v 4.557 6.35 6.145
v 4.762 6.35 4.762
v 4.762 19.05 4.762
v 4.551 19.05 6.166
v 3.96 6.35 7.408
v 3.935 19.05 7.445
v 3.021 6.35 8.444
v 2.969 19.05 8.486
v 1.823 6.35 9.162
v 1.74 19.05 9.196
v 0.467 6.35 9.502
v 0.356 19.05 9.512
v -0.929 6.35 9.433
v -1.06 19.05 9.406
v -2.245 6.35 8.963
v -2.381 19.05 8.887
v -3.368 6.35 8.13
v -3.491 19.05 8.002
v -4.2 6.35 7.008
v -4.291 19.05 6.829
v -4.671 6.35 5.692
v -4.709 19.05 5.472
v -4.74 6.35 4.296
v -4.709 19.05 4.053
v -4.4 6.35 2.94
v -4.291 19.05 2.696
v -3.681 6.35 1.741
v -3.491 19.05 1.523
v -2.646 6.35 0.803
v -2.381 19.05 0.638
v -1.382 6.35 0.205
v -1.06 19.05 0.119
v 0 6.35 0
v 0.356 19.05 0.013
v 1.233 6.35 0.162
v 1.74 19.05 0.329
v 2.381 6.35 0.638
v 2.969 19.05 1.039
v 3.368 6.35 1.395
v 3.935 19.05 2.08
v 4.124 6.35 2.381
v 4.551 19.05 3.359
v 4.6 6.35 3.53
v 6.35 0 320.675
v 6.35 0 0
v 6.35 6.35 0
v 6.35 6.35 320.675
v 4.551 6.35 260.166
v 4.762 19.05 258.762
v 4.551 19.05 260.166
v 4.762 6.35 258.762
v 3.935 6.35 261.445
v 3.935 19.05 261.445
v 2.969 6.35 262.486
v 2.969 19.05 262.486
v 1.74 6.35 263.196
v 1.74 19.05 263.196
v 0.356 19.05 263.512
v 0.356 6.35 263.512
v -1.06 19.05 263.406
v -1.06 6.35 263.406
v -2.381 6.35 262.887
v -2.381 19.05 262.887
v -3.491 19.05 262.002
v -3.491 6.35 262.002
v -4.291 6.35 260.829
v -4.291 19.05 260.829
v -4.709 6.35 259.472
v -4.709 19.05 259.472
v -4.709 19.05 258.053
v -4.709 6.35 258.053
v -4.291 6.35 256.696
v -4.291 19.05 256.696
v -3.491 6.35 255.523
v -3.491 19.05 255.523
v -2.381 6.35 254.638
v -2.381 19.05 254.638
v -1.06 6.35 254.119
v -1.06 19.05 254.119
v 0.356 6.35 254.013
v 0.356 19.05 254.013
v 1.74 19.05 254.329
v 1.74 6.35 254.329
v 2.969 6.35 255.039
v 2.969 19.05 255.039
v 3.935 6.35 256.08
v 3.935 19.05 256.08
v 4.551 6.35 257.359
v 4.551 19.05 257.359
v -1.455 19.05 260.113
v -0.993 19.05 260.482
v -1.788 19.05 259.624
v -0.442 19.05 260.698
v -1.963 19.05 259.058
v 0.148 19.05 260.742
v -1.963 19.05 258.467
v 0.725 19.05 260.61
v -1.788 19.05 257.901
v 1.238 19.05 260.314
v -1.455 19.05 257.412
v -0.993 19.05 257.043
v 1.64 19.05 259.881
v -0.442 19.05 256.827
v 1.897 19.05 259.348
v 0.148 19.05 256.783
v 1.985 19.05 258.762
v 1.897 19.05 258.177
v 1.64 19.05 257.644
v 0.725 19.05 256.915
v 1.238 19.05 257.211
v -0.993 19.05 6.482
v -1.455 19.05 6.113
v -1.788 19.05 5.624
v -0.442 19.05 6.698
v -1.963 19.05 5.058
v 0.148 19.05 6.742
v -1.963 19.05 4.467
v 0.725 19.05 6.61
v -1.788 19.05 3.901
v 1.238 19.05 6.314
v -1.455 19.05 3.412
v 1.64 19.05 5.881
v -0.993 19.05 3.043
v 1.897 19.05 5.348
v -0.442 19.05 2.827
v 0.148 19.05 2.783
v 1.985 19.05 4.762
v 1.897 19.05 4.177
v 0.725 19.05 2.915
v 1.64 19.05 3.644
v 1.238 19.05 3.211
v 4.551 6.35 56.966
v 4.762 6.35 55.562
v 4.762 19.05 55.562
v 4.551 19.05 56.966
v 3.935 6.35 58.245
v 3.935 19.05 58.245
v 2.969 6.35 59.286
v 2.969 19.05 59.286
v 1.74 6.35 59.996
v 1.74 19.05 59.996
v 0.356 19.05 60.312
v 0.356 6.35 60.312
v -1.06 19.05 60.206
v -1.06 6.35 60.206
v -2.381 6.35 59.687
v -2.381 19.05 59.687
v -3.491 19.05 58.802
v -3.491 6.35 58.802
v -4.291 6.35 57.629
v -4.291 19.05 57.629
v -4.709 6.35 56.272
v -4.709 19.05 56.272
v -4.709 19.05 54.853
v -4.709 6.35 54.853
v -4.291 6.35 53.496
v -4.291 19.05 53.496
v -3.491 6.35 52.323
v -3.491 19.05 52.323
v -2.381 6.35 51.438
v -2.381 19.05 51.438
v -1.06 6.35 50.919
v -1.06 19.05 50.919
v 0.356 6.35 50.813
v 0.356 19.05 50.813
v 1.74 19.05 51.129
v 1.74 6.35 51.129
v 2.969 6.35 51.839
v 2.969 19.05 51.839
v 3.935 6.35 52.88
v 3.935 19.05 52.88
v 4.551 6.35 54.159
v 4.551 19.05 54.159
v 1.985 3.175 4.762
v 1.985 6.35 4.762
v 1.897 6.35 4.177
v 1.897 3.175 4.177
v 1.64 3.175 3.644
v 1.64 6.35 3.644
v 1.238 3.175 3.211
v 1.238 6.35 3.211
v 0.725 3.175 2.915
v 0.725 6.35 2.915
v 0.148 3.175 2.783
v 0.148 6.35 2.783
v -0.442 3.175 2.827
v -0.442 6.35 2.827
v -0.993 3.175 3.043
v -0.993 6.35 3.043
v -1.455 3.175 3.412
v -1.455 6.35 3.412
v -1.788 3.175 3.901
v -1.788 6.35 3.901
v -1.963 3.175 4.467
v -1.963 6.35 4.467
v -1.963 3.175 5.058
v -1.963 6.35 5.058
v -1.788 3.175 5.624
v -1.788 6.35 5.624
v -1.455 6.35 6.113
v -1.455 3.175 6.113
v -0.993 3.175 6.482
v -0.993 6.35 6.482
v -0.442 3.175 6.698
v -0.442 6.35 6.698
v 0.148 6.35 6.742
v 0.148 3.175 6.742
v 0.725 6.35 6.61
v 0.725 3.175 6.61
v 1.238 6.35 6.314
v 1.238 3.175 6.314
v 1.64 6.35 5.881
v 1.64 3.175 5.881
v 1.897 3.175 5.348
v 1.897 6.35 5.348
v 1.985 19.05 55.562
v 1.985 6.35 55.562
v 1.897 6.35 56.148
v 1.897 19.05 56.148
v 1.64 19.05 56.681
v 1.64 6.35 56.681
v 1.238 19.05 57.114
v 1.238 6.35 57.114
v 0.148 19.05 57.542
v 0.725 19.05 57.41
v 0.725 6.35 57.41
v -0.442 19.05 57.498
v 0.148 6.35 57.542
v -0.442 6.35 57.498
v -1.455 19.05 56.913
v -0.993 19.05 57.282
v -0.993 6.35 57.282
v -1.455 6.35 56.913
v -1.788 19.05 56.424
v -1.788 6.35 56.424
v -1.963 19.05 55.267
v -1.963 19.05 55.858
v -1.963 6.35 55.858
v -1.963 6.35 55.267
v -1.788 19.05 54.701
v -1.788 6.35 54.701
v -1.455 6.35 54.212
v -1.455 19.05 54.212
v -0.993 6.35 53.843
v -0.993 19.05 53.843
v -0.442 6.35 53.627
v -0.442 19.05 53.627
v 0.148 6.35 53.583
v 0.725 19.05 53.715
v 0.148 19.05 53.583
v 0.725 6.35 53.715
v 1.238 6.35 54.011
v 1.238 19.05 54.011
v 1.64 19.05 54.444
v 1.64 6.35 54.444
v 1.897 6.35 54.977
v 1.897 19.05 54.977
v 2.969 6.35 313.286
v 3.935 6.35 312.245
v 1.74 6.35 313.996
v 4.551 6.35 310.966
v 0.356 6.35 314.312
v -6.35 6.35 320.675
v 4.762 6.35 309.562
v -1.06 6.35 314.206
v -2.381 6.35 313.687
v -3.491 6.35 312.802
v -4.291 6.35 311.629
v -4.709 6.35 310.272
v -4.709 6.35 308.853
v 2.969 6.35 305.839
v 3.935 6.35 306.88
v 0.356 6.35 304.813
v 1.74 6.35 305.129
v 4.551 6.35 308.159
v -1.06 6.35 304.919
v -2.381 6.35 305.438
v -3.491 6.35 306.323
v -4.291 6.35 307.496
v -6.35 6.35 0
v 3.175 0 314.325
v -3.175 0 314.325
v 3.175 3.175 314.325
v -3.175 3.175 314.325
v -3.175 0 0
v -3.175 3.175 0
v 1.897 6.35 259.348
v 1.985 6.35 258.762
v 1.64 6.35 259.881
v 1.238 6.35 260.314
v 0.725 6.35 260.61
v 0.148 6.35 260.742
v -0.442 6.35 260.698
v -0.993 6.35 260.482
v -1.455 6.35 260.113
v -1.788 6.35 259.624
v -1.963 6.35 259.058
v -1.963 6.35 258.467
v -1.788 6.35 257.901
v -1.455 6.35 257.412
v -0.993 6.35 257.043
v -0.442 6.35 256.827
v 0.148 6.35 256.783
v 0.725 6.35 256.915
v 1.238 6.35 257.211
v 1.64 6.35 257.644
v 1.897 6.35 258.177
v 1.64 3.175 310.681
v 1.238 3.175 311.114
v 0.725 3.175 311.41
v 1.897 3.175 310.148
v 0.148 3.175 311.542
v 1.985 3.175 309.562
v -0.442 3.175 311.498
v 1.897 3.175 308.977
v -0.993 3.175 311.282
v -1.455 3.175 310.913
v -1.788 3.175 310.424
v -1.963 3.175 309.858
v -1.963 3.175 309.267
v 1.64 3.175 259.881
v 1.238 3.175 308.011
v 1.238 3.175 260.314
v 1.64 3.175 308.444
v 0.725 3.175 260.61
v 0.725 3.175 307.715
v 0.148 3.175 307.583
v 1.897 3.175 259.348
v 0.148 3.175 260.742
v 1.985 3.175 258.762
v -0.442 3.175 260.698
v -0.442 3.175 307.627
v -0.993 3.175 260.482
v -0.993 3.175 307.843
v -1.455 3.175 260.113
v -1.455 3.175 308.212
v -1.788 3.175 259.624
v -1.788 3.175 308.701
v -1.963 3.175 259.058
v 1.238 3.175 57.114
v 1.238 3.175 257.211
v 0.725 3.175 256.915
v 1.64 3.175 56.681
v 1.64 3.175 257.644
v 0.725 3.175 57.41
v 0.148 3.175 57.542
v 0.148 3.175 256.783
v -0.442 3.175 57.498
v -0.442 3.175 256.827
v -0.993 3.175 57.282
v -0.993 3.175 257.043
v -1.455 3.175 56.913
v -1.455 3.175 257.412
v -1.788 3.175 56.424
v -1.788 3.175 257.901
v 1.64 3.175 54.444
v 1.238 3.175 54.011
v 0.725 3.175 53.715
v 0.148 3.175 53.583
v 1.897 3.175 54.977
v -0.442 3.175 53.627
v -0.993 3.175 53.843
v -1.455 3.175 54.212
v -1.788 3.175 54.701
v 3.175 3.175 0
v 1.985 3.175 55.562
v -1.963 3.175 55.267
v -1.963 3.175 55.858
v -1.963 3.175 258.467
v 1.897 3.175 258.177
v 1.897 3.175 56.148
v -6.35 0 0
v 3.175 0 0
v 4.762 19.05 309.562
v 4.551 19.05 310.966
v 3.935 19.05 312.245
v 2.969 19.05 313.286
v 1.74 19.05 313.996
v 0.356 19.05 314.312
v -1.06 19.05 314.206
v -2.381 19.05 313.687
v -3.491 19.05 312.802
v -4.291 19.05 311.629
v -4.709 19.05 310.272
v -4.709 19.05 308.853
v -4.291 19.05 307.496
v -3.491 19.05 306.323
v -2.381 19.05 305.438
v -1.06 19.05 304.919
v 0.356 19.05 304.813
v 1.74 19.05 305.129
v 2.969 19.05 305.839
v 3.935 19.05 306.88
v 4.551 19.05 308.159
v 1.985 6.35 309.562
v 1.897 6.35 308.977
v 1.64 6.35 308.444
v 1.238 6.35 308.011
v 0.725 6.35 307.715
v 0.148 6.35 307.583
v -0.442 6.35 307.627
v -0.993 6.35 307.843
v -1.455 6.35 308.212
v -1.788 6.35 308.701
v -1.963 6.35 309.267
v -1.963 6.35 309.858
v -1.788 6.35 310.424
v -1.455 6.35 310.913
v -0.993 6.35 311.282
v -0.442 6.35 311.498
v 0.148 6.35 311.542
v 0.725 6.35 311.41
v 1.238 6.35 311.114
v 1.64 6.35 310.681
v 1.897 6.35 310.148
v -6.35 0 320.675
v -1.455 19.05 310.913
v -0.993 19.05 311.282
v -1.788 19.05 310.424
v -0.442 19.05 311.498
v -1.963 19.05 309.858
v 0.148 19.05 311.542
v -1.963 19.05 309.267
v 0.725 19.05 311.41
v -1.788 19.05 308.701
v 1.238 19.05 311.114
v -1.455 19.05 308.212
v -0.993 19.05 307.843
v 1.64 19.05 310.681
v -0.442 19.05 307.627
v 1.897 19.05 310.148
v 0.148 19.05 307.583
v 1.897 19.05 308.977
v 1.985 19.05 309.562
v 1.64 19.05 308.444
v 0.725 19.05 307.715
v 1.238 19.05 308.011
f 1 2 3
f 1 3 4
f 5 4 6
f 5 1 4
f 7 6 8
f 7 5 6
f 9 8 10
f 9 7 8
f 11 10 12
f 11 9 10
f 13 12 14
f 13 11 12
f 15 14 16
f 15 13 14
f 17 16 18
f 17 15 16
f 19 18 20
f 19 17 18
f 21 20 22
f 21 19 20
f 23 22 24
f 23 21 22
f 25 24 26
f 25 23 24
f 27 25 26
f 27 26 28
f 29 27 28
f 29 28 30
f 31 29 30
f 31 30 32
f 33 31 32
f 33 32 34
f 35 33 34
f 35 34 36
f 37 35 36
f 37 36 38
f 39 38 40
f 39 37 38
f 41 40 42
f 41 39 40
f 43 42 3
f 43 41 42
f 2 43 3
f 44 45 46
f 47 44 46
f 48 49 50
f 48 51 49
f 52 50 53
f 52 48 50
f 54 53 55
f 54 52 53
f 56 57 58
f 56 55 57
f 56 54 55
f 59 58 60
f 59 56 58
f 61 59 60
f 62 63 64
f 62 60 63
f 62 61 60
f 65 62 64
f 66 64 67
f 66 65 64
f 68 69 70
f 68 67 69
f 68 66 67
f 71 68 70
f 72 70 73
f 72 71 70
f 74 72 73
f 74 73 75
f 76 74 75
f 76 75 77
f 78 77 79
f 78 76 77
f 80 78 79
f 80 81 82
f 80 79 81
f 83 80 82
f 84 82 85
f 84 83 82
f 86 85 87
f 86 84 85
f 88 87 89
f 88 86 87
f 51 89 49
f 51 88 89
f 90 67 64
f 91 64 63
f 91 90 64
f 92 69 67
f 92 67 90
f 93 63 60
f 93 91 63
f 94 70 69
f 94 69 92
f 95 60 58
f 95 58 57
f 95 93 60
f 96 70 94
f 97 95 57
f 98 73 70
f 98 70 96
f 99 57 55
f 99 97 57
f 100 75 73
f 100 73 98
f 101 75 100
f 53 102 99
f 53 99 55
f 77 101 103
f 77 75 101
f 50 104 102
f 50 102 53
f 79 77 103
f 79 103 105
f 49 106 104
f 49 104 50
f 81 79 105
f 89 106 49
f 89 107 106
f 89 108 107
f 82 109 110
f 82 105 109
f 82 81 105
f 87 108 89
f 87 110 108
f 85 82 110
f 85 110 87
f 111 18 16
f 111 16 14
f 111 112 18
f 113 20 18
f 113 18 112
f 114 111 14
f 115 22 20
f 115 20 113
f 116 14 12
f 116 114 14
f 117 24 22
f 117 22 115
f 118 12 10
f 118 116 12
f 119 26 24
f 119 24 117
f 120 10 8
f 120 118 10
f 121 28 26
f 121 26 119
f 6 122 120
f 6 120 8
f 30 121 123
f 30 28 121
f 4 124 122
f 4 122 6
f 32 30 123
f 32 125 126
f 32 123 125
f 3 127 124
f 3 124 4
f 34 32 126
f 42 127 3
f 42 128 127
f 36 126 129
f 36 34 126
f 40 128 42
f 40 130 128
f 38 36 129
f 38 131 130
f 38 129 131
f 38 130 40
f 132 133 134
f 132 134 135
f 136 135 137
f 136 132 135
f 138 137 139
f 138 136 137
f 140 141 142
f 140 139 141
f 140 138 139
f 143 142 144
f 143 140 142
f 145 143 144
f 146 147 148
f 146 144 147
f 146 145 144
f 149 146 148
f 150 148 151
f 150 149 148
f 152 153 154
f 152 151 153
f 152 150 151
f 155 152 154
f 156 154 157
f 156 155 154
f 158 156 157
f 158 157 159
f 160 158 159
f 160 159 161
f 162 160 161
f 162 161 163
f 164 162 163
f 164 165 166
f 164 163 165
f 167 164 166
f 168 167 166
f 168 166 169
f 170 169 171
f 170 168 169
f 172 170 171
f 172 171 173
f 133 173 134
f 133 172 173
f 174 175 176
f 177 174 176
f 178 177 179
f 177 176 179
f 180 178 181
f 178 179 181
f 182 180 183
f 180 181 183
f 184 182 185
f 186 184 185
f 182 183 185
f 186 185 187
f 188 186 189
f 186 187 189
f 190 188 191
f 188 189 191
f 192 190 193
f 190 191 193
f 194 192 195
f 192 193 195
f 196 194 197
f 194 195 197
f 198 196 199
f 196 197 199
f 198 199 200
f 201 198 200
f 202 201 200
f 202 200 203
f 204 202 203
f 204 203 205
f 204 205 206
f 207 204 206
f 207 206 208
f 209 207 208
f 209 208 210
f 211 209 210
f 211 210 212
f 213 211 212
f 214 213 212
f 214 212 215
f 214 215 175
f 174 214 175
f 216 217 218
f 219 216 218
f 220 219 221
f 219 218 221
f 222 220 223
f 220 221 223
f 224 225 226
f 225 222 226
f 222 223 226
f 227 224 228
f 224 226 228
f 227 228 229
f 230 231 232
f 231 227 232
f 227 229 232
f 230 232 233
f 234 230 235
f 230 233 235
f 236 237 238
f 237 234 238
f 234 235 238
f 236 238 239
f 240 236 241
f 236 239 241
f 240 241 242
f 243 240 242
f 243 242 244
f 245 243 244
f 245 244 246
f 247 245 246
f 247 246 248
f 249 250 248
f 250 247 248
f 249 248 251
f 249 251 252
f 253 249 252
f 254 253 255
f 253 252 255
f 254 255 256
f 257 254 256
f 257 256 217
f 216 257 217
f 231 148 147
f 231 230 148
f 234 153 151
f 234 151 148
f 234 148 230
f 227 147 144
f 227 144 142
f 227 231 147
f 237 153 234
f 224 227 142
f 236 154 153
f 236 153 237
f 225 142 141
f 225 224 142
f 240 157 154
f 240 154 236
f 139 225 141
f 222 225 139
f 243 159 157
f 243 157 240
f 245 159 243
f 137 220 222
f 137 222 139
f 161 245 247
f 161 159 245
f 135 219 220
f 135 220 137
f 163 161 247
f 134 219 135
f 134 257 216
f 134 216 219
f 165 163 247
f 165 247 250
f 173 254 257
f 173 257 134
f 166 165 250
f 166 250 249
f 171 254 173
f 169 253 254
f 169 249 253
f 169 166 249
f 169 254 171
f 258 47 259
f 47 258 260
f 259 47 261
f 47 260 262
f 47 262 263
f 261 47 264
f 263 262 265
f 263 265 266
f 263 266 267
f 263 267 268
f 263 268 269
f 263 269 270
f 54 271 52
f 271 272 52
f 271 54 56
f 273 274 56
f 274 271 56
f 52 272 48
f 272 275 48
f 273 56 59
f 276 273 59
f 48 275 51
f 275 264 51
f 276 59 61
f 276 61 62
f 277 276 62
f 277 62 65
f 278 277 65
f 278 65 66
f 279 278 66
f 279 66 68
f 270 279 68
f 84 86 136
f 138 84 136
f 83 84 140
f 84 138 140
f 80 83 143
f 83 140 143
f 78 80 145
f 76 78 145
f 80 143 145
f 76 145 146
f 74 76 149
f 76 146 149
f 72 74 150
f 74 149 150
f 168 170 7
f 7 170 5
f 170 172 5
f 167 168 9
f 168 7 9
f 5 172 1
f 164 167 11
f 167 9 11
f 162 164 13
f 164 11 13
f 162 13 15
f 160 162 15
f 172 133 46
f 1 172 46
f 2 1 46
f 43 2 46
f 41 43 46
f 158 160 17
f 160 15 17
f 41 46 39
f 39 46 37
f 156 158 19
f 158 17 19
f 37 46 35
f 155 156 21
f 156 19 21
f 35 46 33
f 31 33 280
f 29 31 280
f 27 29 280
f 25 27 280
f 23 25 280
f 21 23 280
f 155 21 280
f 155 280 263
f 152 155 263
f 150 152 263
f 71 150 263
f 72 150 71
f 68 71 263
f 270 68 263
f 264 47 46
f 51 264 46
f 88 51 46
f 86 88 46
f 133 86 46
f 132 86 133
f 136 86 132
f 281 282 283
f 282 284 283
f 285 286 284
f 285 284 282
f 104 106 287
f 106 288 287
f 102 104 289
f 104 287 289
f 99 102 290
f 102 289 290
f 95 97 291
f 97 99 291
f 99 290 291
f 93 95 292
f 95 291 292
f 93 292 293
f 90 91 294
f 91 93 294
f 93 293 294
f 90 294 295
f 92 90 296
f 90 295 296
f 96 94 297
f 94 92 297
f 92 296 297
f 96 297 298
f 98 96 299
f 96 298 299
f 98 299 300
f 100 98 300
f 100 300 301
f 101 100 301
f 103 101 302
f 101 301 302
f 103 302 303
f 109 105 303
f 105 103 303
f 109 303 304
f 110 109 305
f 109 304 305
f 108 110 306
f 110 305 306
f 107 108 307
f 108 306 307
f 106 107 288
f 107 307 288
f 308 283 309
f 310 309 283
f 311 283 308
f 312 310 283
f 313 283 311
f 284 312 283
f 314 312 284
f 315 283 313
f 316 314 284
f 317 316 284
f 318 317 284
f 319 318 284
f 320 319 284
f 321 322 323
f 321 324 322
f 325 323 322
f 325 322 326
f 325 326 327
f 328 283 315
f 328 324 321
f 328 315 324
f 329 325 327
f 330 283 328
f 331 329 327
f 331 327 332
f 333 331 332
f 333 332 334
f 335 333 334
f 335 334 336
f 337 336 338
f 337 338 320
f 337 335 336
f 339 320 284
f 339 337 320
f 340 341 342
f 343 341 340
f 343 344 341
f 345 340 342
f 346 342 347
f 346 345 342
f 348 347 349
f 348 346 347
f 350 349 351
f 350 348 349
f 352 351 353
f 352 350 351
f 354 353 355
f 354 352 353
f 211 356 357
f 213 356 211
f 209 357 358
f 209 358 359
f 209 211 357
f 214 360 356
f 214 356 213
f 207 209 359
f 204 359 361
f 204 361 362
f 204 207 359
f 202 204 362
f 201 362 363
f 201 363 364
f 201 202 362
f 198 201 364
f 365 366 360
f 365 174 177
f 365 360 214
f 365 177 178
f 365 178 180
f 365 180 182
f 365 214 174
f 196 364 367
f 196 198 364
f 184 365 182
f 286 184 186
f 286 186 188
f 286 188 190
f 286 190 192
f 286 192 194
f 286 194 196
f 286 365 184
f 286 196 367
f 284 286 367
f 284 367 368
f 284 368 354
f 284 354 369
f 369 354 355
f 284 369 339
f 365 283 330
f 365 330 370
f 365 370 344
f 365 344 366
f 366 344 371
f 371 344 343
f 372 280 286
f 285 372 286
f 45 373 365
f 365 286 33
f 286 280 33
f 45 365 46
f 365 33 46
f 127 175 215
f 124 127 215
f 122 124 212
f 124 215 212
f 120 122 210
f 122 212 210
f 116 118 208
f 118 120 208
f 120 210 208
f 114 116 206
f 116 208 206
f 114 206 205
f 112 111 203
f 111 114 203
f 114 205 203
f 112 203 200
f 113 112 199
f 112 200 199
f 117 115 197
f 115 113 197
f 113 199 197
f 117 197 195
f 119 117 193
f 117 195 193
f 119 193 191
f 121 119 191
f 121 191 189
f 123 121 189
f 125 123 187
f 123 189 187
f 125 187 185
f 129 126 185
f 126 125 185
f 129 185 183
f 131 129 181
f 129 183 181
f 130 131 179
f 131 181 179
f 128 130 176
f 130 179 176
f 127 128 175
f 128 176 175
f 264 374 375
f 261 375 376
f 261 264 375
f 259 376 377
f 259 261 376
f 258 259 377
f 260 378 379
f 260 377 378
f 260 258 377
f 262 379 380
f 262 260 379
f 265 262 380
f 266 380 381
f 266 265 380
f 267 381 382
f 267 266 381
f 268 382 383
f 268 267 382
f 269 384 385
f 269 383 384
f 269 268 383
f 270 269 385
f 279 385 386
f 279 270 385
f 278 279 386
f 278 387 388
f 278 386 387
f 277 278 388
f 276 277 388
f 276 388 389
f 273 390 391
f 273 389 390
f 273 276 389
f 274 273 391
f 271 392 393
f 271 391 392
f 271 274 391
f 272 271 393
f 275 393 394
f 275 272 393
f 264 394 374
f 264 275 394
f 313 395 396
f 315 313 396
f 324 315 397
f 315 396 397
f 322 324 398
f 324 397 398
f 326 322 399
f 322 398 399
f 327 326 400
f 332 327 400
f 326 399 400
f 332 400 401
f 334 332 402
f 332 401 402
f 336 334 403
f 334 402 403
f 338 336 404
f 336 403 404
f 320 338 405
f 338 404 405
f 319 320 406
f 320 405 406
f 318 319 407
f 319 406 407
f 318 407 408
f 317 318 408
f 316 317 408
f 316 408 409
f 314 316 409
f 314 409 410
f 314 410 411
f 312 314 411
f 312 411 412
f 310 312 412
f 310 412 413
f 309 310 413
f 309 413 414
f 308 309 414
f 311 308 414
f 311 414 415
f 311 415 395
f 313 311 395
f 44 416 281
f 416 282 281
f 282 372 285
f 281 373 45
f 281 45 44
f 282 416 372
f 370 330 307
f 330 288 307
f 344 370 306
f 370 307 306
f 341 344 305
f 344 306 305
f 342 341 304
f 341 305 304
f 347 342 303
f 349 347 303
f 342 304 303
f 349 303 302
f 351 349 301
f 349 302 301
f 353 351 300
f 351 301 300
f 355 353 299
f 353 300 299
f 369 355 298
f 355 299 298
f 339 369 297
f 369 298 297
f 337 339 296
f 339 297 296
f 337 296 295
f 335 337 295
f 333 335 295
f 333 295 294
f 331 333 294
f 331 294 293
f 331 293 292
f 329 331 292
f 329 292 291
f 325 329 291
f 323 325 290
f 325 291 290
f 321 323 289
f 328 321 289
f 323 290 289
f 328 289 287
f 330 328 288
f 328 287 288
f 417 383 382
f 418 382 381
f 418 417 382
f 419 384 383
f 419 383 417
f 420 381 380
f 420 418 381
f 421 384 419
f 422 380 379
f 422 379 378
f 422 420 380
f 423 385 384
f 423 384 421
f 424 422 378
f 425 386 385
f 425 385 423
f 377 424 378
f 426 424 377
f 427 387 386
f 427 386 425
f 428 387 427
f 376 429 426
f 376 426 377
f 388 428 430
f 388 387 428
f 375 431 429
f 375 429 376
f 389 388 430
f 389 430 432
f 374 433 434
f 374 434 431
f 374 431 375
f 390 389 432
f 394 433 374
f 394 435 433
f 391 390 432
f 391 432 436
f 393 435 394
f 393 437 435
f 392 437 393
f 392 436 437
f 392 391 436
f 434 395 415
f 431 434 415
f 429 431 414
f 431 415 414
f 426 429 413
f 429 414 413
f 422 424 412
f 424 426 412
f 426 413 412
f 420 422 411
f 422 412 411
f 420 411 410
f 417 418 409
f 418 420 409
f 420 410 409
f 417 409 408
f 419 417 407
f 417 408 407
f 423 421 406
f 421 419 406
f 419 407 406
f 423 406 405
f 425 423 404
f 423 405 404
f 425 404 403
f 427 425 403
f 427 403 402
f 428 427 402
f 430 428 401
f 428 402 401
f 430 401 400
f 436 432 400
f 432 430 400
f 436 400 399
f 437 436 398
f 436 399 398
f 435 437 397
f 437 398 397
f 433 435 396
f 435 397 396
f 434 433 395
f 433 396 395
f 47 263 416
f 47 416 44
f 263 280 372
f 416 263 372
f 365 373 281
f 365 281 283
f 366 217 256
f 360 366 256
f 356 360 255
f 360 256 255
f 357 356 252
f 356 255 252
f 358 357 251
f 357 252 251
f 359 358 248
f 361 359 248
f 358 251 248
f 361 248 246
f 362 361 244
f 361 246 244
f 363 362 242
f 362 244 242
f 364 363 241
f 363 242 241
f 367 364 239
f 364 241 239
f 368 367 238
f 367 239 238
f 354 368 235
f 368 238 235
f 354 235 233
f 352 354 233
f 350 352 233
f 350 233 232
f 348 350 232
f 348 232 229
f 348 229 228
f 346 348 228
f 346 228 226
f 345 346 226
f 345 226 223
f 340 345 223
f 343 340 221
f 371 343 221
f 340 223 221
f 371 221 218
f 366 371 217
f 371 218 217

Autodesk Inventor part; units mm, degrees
ref_plane "YZ Plane" through (0, 0, 0) normal (1, 0, 0) x (0, 1, 0)
ref_plane "XZ Plane" through (0, 0, 0) normal (0, 1, 0) x (-1, 0, 0)
ref_plane "XY Plane" through (0, 0, 0) normal (0, 0, 1) x (1, 0, 0)
sketch "Sketch1" plane through (0, 0, 0) normal (0, 0, 1) x (1, 0, 0)
  line L0 (3.175, 0) -> (3.175, 3.175)
  line L1 (3.175, 3.175) -> (-3.175, 3.175)
  line L2 (-3.175, 3.175) -> (-3.175, 0)
  line L3 (6.35, 0) -> (6.35, 6.35)
  line L4 (6.35, 6.35) -> (-6.35, 6.35)
  line L5 (-6.35, 6.35) -> (-6.35, 0)
  line L6 (-6.35, 0) -> (-3.175, 0)
  line L7 (3.175, 0) -> (6.35, 0)
  point P0 (0, 0)
extrude "Extrusion1" add sketch "Sketch1" along normal blind 314.325
sketch "Sketch2" plane through (-6.35, 6.35, 0) normal (0, 1, 0) x (1, 0, 0)
  circle A0 centre (6.35, -4.7625) radius 1.985
  circle A1 centre (6.35, -55.5625) radius 1.985
  circle A2 centre (6.35, -309.5625) radius 1.985
  circle A3 centre (6.35, -258.7625) radius 1.985
  point P0 (6.35, 0)
  dimension "d2" = 3.97
  dimension "d3" = 3.97
  dimension "d4" = 3.97
  dimension "d5" = 3.97
extrude "Extrusion2" cut sketch "Sketch2" against normal blind 314.325
sketch "Sketch3" plane through (-6.35, 6.35, 0) normal (0, 1, 0) x (1, 0, 0)
  circle A0 centre (6.35, -4.7625) radius 1.985 projected
  circle A1 centre (6.35, -55.5625) radius 1.985 projected
  circle A2 centre (6.35, -258.7625) radius 1.985 projected
  circle A3 centre (6.35, -309.5625) radius 1.985 projected
  circle A4 centre (6.35, -4.7625) radius 4.7625
  circle A5 centre (6.35, -55.5625) radius 4.7625
  circle A6 centre (6.35, -258.7625) radius 4.7625
  circle A7 centre (6.35, -309.5625) radius 4.7625
  point P0 (6.35, 0)
extrude "Extrusion3" add sketch "Sketch3" along normal blind 12.7
sketch "Sketch4" plane through (0, 0, 314.325) normal (0, 0, 1) x (1, 0, 0)
  line L0 (-6.35, 0) -> (-3.175, 0) projected
  line L1 (-6.35, 0) -> (6.35, 0)
  line L2 (6.35, 0) -> (6.35, 6.35)
  line L3 (6.35, 6.35) -> (-6.35, 6.35)
  line L4 (-6.35, 6.35) -> (-6.35, 0)
  point P0 (0, 0)
extrude "Extrusion4" add sketch "Sketch4" along normal blind 6.35
properties part number "crossbrace_jig"
